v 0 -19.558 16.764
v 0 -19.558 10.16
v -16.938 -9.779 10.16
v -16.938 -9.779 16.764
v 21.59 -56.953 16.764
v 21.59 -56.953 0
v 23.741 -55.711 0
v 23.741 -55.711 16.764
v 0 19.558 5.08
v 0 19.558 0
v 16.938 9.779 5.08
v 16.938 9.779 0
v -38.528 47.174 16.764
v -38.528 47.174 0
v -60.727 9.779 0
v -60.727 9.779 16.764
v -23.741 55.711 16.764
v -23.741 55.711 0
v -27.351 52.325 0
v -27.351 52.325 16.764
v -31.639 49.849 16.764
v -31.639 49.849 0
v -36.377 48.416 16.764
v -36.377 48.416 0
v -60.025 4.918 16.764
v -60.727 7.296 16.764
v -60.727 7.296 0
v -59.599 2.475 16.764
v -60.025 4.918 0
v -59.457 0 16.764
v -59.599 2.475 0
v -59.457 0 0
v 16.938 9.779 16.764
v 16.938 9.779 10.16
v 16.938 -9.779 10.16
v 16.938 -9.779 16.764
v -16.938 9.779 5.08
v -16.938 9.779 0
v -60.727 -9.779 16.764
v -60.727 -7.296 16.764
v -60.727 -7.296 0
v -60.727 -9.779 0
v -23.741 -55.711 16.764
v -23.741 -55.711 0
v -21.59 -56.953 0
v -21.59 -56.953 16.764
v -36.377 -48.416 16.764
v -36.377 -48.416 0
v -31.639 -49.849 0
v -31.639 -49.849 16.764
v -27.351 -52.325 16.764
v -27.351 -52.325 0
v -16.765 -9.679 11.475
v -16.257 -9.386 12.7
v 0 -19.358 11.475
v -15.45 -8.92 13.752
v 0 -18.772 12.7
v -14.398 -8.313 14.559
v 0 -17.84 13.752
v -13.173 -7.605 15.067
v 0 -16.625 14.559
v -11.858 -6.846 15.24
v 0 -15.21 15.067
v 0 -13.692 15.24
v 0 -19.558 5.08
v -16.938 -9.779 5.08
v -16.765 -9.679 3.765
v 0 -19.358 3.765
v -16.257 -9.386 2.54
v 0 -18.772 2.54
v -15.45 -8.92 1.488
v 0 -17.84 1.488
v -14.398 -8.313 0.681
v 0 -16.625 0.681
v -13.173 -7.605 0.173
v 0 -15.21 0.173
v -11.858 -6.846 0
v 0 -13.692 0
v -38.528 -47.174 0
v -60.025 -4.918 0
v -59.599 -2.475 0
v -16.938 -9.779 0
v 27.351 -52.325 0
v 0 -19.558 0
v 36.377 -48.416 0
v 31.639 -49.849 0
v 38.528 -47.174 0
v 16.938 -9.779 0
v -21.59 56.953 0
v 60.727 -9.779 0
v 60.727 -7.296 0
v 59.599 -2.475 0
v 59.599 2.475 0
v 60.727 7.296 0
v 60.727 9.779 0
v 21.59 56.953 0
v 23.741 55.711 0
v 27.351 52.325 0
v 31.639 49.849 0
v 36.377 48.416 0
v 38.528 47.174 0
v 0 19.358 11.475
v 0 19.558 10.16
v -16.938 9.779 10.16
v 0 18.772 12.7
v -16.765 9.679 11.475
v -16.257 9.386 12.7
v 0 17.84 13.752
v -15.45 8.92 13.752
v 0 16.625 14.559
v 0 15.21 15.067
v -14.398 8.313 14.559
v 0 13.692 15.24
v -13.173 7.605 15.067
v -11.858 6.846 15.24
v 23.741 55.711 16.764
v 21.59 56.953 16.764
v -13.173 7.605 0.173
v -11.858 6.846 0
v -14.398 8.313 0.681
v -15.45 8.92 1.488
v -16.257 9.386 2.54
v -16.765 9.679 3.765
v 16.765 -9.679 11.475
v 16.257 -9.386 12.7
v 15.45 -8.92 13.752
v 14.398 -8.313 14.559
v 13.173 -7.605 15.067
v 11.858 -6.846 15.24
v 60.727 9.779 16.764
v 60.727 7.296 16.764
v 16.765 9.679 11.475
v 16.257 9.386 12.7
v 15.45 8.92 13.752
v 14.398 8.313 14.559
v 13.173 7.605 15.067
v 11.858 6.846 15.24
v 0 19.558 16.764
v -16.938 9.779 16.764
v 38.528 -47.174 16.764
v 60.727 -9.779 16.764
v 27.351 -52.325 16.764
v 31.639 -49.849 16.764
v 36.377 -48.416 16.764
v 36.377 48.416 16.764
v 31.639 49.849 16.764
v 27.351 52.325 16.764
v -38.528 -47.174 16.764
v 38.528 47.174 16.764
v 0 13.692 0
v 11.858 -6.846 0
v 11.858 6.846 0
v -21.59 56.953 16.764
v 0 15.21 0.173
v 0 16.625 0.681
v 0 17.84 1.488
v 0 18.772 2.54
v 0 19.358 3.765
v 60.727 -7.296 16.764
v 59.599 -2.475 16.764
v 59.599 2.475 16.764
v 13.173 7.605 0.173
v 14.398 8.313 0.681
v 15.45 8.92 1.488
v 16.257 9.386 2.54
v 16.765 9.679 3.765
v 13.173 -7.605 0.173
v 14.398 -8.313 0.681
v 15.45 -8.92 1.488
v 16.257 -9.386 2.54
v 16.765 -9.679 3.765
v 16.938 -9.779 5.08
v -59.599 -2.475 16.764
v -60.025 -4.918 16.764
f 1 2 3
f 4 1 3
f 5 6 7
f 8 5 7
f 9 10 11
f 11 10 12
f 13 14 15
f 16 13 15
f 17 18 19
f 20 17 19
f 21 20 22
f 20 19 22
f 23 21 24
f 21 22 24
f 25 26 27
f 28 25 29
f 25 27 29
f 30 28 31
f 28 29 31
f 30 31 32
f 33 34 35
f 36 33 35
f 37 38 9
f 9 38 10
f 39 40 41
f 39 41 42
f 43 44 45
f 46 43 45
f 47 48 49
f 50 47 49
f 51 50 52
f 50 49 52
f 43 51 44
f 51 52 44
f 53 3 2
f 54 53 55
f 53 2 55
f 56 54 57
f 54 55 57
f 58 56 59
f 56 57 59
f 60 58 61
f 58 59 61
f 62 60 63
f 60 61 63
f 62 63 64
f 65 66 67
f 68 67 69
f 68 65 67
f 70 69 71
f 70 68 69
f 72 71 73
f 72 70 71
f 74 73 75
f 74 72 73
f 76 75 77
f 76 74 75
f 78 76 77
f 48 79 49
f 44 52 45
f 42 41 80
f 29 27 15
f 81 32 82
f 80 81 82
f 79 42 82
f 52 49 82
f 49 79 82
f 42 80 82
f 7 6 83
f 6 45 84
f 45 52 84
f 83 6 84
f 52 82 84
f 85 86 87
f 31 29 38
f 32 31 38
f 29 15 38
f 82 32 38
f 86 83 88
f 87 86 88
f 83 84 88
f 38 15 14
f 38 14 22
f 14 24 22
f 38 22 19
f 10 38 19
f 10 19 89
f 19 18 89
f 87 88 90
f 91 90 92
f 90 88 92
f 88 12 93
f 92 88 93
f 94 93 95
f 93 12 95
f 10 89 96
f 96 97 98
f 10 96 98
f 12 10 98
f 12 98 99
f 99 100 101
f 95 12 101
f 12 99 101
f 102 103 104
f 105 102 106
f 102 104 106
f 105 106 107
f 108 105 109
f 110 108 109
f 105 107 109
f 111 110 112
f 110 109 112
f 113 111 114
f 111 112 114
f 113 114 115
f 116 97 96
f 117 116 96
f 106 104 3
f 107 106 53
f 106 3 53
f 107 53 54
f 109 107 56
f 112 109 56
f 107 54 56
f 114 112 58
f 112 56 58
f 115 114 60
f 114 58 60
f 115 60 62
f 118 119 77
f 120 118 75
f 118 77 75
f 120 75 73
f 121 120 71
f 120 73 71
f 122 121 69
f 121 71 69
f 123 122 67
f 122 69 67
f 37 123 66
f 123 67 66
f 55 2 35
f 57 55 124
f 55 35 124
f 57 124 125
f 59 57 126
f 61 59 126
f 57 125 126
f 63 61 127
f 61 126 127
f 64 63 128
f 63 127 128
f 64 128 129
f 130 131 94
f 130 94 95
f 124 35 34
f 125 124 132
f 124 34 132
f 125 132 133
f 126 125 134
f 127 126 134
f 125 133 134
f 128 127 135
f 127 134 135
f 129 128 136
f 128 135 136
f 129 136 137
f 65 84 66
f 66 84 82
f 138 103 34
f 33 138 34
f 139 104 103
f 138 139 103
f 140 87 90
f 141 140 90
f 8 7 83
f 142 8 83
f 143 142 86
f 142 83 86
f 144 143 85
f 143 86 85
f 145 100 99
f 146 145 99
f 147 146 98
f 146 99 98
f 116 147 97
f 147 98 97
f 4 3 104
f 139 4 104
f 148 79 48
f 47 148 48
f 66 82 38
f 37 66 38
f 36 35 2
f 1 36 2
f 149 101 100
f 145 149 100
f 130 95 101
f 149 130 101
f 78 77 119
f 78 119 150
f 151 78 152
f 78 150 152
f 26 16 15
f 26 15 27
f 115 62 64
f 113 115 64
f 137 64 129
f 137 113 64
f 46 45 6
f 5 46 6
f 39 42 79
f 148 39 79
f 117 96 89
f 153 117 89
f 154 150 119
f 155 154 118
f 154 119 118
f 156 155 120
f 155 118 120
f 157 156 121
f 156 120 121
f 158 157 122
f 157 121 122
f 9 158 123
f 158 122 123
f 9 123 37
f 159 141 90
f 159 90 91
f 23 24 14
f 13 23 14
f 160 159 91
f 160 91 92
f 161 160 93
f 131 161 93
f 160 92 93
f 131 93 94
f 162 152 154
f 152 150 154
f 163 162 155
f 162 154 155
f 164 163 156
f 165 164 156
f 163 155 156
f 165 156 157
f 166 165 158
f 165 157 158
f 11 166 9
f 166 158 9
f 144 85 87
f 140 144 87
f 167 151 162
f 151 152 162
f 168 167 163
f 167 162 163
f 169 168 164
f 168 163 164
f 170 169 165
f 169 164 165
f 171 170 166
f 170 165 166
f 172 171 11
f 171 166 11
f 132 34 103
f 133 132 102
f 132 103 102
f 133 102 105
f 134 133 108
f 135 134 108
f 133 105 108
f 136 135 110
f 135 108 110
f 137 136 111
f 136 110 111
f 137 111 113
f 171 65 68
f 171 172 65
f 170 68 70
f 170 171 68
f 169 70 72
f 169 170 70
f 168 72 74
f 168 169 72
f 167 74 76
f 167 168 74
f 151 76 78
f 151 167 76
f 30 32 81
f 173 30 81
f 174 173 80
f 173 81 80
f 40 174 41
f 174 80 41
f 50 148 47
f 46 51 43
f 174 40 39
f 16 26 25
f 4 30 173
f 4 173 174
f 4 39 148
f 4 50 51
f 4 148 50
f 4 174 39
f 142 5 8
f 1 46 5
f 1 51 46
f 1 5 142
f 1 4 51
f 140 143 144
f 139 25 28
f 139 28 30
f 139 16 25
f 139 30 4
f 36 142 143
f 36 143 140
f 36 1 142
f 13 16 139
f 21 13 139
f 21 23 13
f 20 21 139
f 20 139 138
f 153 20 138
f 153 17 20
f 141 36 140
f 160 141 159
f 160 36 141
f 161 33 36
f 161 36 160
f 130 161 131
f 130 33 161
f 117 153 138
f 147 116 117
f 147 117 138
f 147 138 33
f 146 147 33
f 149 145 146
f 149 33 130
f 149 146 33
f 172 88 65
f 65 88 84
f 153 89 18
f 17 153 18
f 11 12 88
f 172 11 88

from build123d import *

# Parameters (mm, degrees)
F1_DEPTH = 15.24
F2_R     = 5.08
F3_R     = 5.08
F4_DEPTH = 16.764


with BuildPart() as f1:
    # F0 (on Top) → F1 (new body)
    with BuildSketch(Plane.XY):
        Polygon((0, -19.558), (16.937725, -9.779), (16.937725, 9.779), (0, 19.558), (-16.937725, 9.779), (-16.937725, -9.779), align=None)
    extrude(amount=F1_DEPTH)

    # F2
    f2_edges = [f1.edges().sort_by_distance(p)[0] for p in [
        (-8.468862, -14.6685, 15.24),
        (8.468862, -14.6685, 15.24),
        (16.937725, 0, 15.24),
        (8.468862, 14.6685, 15.24),
        (-8.468862, 14.6685, 15.24),
        (-16.937725, 0, 15.24),
    ]]
    fillet(f2_edges, radius=F2_R)

    # F3
    f3_edges = [f1.edges().sort_by_distance(p)[0] for p in [
        (-8.468862, -14.6685, 0),
        (8.468862, -14.6685, 0),
        (16.937725, 0, 0),
        (8.468862, 14.6685, 0),
        (-8.468862, 14.6685, 0),
        (-16.937725, 0, 0),
    ]]
    fillet(f3_edges, radius=F3_R)

    # F0 (on Top) → F4 (join)
    with BuildSketch(Plane.XY):
        with BuildLine():
            Line((-38.527725, -47.173977), (-16.937725, -9.779))
            Line((-16.937725, -9.779), (-16.937725, 9.779))
            Line((-16.937725, 9.779), (-38.527725, 47.173977))
            Line((-38.527725, 47.173977), (-60.727019, 9.779))
            Line((-60.727019, 9.779), (-60.727019, 7.295595))
            ThreePointArc((-60.727019, 7.295595), (-59.776888, 3.702654), (-59.457019, 0))
            ThreePointArc((-59.457019, 0), (-59.776888, -3.702654), (-60.727019, -7.295595))
            Line((-60.727019, -7.295595), (-60.727019, -9.779))
            Line((-60.727019, -9.779), (-38.527725, -47.173977))
        make_face()
        with BuildLine():
            Line((-16.937725, 9.779), (0, 19.558))
            Line((0, 19.558), (-21.59, 56.952977))
            Line((-21.59, 56.952977), (-23.740692, 55.711274))
            ThreePointArc((-23.740692, 55.711274), (-29.423862, 50.963625), (-36.377033, 48.41568))
            Line((-36.377033, 48.41568), (-38.527725, 47.173977))
            Line((-38.527725, 47.173977), (-16.937725, 9.779))
        make_face()
        Polygon((-21.59, 56.952977), (0, 19.558), (21.59, 56.952977), align=None)
        Polygon((16.937725, 9.779), (16.937725, -9.779), (38.527725, -47.173977), (60.727019, -9.779), (17.55615, -9.779), (17.55615, 9.779), (60.727019, 9.779), (38.527725, 47.173977), align=None)
        with BuildLine():
            Line((0, 19.558), (16.937725, 9.779))
            Line((16.937725, 9.779), (38.527725, 47.173977))
            Line((38.527725, 47.173977), (36.377033, 48.41568))
            ThreePointArc((36.377033, 48.41568), (29.423862, 50.963625), (23.740692, 55.711274))
            Line((23.740692, 55.711274), (21.59, 56.952977))
            Line((21.59, 56.952977), (0, 19.558))
        make_face()
        with BuildLine():
            Line((17.55615, -9.779), (60.727019, -9.779))
            Line((60.727019, -9.779), (60.727019, -7.295595))
            ThreePointArc((60.727019, -7.295595), (59.457019, 0), (60.727019, 7.295595))
            Line((60.727019, 7.295595), (60.727019, 9.779))
            Line((60.727019, 9.779), (17.55615, 9.779))
            Line((17.55615, 9.779), (17.55615, -9.779))
        make_face()
        with BuildLine():
            Line((38.527725, -47.173977), (16.937725, -9.779))
            Line((16.937725, -9.779), (0, -19.558))
            Line((0, -19.558), (21.59, -56.952977))
            Line((21.59, -56.952977), (23.740692, -55.711274))
            ThreePointArc((23.740692, -55.711274), (29.423862, -50.963625), (36.377033, -48.41568))
            Line((36.377033, -48.41568), (38.527725, -47.173977))
        make_face()
        Polygon((21.59, -56.952977), (0, -19.558), (-21.59, -56.952977), align=None)
        with BuildLine():
            Line((-21.59, -56.952977), (0, -19.558))
            Line((0, -19.558), (-16.937725, -9.779))
            Line((-16.937725, -9.779), (-38.527725, -47.173977))
            Line((-38.527725, -47.173977), (-36.377033, -48.41568))
            ThreePointArc((-36.377033, -48.41568), (-29.423862, -50.963625), (-23.740692, -55.711274))
            Line((-23.740692, -55.711274), (-21.59, -56.952977))
        make_face()
    extrude(amount=F4_DEPTH)


solid = f1.part
